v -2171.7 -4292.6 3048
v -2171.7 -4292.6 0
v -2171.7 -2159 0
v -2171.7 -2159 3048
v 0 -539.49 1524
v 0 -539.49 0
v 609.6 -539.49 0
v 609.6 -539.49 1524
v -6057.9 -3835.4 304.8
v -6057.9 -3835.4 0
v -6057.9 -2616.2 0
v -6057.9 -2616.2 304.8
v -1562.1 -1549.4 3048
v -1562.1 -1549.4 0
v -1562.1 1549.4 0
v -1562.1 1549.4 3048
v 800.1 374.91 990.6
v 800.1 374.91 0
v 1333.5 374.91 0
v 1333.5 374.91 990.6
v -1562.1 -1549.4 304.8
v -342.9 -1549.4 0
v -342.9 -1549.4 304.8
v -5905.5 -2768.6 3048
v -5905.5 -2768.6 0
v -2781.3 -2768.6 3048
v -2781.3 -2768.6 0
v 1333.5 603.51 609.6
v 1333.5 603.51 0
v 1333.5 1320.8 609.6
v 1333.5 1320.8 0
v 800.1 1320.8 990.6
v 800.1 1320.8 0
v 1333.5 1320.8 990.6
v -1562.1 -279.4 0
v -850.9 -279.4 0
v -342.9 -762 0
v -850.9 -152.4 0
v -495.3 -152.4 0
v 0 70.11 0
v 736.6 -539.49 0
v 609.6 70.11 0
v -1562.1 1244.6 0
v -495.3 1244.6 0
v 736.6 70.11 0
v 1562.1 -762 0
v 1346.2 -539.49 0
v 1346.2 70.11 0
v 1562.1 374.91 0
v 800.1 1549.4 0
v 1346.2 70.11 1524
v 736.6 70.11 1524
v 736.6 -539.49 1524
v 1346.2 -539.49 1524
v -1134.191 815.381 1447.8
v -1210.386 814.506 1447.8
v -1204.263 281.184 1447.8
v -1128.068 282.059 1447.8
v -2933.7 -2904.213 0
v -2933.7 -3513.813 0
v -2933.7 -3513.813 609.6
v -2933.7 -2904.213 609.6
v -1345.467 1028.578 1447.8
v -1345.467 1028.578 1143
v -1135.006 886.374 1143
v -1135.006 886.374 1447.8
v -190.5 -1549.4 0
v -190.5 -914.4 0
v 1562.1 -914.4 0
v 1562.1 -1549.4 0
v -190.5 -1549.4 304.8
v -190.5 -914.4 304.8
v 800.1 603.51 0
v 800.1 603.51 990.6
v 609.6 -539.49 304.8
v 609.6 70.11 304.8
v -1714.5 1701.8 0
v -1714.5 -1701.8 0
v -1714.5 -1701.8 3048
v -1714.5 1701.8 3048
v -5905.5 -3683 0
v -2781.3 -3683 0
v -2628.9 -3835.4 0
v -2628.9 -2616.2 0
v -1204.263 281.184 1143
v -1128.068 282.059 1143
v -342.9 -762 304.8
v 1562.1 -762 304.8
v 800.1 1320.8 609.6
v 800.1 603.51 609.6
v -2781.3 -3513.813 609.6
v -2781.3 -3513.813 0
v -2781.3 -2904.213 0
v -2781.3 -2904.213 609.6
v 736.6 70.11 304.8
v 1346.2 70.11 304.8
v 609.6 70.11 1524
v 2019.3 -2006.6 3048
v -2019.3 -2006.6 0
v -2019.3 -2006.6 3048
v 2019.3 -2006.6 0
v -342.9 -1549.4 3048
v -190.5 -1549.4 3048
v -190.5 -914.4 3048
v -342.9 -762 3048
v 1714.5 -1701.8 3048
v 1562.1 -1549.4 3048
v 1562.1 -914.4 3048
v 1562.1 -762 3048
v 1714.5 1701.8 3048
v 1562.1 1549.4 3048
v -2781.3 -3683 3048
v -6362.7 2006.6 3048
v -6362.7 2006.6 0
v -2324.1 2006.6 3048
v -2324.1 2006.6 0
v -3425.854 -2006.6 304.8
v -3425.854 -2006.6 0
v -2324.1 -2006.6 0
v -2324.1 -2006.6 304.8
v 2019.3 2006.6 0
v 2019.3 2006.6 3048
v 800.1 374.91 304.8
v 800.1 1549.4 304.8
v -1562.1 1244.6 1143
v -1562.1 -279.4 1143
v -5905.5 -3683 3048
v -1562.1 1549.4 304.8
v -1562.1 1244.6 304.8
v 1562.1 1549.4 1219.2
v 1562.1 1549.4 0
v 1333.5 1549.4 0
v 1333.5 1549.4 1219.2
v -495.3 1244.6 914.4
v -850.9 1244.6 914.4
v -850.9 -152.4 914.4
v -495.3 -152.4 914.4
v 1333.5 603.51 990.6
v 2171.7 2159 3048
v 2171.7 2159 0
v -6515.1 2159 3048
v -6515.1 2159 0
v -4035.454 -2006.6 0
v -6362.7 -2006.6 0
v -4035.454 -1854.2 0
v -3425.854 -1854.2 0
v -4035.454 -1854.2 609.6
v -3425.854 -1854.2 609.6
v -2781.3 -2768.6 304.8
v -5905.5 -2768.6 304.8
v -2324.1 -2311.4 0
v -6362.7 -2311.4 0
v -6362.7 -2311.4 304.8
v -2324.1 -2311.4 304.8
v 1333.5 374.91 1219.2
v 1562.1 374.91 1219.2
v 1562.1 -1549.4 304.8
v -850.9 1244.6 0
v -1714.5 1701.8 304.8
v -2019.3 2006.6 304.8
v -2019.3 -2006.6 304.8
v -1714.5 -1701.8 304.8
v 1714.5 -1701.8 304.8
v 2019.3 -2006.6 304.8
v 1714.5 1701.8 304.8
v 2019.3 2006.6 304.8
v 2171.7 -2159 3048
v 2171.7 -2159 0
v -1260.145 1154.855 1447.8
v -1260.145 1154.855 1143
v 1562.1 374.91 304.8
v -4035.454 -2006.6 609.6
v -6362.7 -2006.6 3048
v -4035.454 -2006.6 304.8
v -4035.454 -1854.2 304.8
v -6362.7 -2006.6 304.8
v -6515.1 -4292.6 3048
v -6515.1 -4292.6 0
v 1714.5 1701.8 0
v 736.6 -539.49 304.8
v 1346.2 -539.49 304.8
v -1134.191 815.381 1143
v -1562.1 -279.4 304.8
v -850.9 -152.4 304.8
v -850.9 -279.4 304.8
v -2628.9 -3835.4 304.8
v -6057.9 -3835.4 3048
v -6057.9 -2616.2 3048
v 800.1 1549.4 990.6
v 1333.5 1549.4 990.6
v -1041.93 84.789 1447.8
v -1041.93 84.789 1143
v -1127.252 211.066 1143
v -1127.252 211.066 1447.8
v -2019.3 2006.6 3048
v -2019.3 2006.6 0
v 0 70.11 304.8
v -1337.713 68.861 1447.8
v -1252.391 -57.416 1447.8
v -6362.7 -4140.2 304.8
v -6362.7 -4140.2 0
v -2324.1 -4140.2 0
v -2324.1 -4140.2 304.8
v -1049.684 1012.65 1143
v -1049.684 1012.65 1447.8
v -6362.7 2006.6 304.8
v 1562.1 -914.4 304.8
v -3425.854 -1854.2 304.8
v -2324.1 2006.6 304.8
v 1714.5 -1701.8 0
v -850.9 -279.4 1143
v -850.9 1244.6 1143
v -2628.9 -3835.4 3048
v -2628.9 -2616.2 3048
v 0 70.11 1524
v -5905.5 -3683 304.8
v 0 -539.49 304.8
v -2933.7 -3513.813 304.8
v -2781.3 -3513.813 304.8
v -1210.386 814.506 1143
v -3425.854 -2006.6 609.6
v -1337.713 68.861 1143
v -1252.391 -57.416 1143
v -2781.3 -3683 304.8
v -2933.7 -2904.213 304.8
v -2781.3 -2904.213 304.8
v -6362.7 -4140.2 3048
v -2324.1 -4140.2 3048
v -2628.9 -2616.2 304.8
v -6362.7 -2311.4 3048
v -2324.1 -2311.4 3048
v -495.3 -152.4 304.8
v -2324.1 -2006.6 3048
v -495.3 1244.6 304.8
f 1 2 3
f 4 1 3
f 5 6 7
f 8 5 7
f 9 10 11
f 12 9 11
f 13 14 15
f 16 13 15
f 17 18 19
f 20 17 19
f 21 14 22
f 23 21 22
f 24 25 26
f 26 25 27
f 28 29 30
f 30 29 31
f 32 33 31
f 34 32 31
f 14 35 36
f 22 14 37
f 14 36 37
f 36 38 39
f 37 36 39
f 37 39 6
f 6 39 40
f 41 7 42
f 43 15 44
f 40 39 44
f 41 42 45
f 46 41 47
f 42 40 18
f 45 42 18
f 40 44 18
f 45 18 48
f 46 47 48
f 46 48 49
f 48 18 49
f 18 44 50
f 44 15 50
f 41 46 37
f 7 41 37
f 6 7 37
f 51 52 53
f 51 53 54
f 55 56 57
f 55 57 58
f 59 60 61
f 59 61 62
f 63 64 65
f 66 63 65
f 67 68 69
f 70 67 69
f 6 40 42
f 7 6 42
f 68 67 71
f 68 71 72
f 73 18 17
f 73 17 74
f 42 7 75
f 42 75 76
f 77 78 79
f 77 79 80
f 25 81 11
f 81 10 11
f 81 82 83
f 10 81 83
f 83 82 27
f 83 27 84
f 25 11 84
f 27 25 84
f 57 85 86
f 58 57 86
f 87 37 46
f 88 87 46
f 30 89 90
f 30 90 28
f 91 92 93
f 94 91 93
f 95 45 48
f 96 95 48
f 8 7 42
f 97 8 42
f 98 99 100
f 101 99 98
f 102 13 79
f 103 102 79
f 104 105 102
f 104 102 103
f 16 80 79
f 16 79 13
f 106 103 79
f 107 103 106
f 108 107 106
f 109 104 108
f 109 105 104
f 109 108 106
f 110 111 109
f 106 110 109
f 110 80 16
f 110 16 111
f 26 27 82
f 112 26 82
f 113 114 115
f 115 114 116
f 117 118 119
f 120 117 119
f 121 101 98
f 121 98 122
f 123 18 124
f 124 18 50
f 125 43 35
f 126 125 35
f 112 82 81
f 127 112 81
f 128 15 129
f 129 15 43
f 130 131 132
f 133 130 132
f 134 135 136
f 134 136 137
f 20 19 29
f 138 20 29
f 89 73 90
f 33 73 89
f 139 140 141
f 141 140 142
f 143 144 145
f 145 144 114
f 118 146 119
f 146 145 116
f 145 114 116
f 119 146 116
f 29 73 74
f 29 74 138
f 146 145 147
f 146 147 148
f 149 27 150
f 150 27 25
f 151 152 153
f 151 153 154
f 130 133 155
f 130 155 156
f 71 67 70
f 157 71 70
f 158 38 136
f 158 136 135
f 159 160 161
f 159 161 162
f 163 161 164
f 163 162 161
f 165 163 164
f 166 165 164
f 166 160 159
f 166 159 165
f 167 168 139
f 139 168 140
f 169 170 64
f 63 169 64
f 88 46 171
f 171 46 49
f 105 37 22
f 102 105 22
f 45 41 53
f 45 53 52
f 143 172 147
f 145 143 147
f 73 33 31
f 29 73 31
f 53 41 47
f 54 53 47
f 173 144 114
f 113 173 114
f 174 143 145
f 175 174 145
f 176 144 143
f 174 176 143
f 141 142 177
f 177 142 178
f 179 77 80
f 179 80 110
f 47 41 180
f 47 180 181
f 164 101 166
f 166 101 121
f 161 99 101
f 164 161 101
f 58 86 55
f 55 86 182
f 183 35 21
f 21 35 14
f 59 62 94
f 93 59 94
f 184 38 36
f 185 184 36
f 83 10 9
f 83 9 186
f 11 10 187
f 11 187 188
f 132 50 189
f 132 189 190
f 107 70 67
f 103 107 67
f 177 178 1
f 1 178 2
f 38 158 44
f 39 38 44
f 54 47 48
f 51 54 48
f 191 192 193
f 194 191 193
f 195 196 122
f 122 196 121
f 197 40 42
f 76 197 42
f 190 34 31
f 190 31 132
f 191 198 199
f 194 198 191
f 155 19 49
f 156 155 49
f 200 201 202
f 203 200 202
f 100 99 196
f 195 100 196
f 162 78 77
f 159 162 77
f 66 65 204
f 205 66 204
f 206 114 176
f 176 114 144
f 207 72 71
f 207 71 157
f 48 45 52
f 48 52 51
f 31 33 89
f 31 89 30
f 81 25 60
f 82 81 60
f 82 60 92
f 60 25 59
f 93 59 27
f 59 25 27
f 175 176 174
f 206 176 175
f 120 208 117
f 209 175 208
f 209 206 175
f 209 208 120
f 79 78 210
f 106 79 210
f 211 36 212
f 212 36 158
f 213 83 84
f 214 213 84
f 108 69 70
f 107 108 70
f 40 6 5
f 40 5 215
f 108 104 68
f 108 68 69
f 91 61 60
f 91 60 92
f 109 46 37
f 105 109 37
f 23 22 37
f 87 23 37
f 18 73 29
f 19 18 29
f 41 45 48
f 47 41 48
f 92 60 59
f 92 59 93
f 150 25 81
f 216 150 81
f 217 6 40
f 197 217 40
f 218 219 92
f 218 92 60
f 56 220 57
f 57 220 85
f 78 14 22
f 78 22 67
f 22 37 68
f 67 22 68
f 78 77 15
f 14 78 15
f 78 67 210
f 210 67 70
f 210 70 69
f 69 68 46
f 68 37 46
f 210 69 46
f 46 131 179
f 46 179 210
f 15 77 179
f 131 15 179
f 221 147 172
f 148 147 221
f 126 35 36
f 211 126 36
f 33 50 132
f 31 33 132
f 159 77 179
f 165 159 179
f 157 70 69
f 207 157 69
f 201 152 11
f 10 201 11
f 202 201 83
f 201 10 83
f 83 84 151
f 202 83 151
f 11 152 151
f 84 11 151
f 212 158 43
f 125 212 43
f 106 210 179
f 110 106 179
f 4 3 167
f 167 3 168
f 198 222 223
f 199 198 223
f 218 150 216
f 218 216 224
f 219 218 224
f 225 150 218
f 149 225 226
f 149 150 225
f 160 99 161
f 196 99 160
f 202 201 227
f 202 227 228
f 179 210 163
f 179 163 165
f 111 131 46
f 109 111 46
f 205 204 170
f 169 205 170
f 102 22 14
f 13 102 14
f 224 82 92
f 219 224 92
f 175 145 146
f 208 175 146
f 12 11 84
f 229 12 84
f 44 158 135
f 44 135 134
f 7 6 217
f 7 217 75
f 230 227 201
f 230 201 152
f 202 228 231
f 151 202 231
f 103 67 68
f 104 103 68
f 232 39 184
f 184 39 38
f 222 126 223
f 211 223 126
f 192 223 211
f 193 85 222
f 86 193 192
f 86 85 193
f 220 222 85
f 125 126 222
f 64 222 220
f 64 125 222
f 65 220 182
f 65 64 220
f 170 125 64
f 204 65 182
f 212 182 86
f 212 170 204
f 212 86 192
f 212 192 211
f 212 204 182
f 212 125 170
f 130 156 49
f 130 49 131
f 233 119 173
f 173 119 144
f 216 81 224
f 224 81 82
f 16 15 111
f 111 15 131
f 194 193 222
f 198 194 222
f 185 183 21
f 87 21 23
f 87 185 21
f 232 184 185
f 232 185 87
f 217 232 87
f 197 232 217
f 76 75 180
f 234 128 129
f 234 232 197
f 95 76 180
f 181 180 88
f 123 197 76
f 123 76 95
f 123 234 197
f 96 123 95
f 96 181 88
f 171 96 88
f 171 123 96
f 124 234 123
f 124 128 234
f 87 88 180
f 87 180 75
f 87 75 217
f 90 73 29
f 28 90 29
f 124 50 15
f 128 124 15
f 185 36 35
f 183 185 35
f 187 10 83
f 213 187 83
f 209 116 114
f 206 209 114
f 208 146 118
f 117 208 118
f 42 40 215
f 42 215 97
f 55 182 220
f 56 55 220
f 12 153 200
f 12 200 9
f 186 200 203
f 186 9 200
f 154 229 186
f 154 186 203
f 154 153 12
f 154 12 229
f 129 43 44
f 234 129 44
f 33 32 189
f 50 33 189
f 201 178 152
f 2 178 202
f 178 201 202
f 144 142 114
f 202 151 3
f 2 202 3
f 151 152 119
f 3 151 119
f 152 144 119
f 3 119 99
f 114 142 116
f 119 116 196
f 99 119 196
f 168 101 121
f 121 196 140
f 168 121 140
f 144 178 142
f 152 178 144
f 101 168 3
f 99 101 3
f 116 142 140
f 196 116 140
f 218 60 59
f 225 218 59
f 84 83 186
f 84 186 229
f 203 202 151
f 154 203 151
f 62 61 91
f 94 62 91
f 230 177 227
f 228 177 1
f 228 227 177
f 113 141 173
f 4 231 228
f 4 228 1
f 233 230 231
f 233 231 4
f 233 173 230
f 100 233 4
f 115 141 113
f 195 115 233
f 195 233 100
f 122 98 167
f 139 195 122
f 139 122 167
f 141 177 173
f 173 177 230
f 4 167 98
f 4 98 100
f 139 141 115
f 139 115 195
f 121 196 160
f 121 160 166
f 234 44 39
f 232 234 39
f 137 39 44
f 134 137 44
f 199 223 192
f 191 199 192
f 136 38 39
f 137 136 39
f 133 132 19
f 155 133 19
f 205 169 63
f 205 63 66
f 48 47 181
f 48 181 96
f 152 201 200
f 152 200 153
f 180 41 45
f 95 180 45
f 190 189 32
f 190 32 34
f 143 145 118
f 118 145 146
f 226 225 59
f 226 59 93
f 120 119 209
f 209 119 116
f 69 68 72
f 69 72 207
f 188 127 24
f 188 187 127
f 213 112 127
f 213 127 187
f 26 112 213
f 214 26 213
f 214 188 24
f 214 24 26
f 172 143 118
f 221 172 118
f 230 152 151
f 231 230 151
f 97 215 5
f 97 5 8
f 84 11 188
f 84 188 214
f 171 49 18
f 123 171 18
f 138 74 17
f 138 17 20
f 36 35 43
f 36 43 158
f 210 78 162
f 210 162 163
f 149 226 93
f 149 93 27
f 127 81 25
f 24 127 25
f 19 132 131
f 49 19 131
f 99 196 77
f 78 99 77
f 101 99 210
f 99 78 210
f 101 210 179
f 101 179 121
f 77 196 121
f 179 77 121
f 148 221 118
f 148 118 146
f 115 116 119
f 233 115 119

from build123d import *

# Parameters (mm, degrees)
F0_W      = 4343.4
F0_H      = 4318
F0_H_2    = 2133.6
F0_W_2    = 4038.6
F0_H_3    = 1828.8
F0_H_4    = 4013.2
F1_DEPTH  = 3048
F0_W_3    = 3429
F0_H_5    = 1219.2
F0_H_6    = 3403.6
F0_W_4    = 533.4
F0_H_7    = 228.6
F2_DEPTH  = 990.6
F0_H_8    = 717.2898056984
F3_DEPTH  = 609.6
F0_W_5    = 609.6
F0_H_9    = 609.6
F4_DEPTH  = 1524
F0_W_6    = 355.6
F0_H_10   = 1397
F5_DEPTH  = 914.4
F6_DEPTH  = 1143
F7_DEPTH  = 1447.8
F8_DEPTH  = 1219.2
F9_DEPTH  = 304.8
F0_W_7    = 1752.6
F0_H_11   = 635
F0_H_12   = 152.4
F10_DEPTH = 609.6
F0_W_8    = 152.4


with BuildPart() as f1:
    # F0 (on Top) → F1 (new body)
    with BuildSketch(Plane.XY):
        with Locations((-4343.4, 0)):
            Rectangle(F0_W, F0_H)
        Polygon((-6362.7, -2006.6), (-6362.7, 2006.6), (-2324.1, 2006.6), (-2324.1, -2006.6), (-3425.8539676666, -2006.6), (-4035.4539676666, -2006.6), align=None, mode=Mode.SUBTRACT)
        with Locations((-4343.4, -3225.8)):
            Rectangle(F0_W, F0_H_2)
        with Locations((-4343.4, -3225.8)):
            Rectangle(F0_W_2, F0_H_3, mode=Mode.SUBTRACT)
        Rectangle(F0_W, F0_H)
        Rectangle(F0_W_2, F0_H_4, mode=Mode.SUBTRACT)
    extrude(amount=F1_DEPTH)


with BuildPart() as f1b:
    # F0 (on Top) → F1, piece 2 (new body)
    with BuildSketch(Plane.XY):
        with Locations((-4343.4, -3225.8)):
            Rectangle(F0_W_3, F0_H_5)
        Polygon((-5905.5, -2768.6), (-2781.3, -2768.6), (-2781.3, -2904.2131900787), (-2781.3, -3513.8131900787), (-2781.3, -3683), (-5905.5, -3683), align=None, mode=Mode.SUBTRACT)
    extrude(amount=F1_DEPTH)


with BuildPart() as f1c:
    # F0 (on Top) → F1, piece 3 (new body)
    with BuildSketch(Plane.XY):
        Rectangle(F0_W_3, F0_H_6)
        Polygon((1333.5, 1549.4), (1562.1, 1549.4), (1562.1, 374.9101943016), (1562.1, -762), (1562.1, -914.4), (1562.1, -1549.4), (-190.5, -1549.4), (-342.9, -1549.4), (-1562.1, -1549.4), (-1562.1, -279.4), (-1562.1, 1244.6), (-1562.1, 1549.4), (800.1, 1549.4), align=None, mode=Mode.SUBTRACT)
        Polygon((1562.1, -914.4), (1562.1, -762), (-342.9, -762), (-342.9, -1549.4), (-190.5, -1549.4), (-190.5, -914.4), align=None)
    extrude(amount=F1_DEPTH)


with BuildPart() as f2:
    # F0 (on Top) → F2 (new body)
    with BuildSketch(Plane.XY):
        with Locations((1066.8, 1435.1)):
            Rectangle(F0_W_4, F0_H_7)
    extrude(amount=F2_DEPTH)


with BuildPart() as f2b:
    # F0 (on Top) → F2, piece 2 (new body)
    with BuildSketch(Plane.XY):
        with Locations((1066.8, 489.2101943016)):
            Rectangle(F0_W_4, F0_H_7)
    extrude(amount=F2_DEPTH)


with BuildPart() as f3:
    # F0 (on Top) → F3 (new body)
    with BuildSketch(Plane.XY):
        with Locations((1066.8, 962.1550971508)):
            Rectangle(F0_W_4, F0_H_8)
    extrude(amount=F3_DEPTH)


with BuildPart() as f4:
    # F0 (on Top) → F4 (new body)
    with BuildSketch(Plane.XY):
        with Locations((304.8, -234.6898056984)):
            Rectangle(F0_W_5, F0_H_9)
    extrude(amount=F4_DEPTH)


with BuildPart() as f4b:
    # F0 (on Top) → F4, piece 2 (new body)
    with BuildSketch(Plane.XY):
        with Locations((1041.4, -234.6898056984)):
            Rectangle(F0_W_5, F0_H_9)
    extrude(amount=F4_DEPTH)


with BuildPart() as f5:
    # F0 (on Top) → F5 (new body)
    with BuildSketch(Plane.XY):
        with Locations((-673.1, 546.1)):
            Rectangle(F0_W_6, F0_H_10)
    extrude(amount=F5_DEPTH)


with BuildPart() as f6:
    # F0 (on Top) → F6 (new body)
    with BuildSketch(Plane.XY):
        Polygon((-850.9, 1244.6), (-1562.1, 1244.6), (-1562.1, -279.4), (-850.9, -279.4), (-850.9, -152.4), align=None)
        Polygon((-1127.2523981686, 211.0656040807), (-1041.9296722146, 84.7889536825), (-1252.3907562116, -57.4155895741), (-1337.7134821655, 68.8610608241), align=None, mode=Mode.SUBTRACT)
        Polygon((-1210.3860998574, 814.505665424), (-1134.1911222959, 815.380533648), (-1128.0675374575, 282.0586040807), (-1204.2625150189, 281.1837358567), align=None, mode=Mode.SUBTRACT)
        Polygon((-1260.1446196279, 1154.8547273028), (-1049.6835356309, 1012.6501840462), (-1135.0062615849, 886.373533648), (-1345.4673455818, 1028.5780769046), align=None, mode=Mode.SUBTRACT)
    extrude(amount=F6_DEPTH)

    # F0 (on Top) → F7 (join)
    with BuildSketch(Plane.XY):
        Polygon((-1135.0062615849, 886.373533648), (-1049.6835356309, 1012.6501840462), (-1260.1446196279, 1154.8547273028), (-1345.4673455818, 1028.5780769046), align=None)
        Polygon((-1128.0675374575, 282.0586040807), (-1134.1911222959, 815.380533648), (-1210.3860998574, 814.505665424), (-1204.2625150189, 281.1837358567), align=None)
        Polygon((-1252.3907562116, -57.4155895741), (-1041.9296722146, 84.7889536825), (-1127.2523981686, 211.0656040807), (-1337.7134821655, 68.8610608241), align=None)
    extrude(amount=F7_DEPTH)


with BuildPart() as f8:
    # F0 (on Top) → F8 (new body)
    with BuildSketch(Plane.XY):
        Polygon((1562.1, 374.9101943016), (1562.1, 1549.4), (1333.5, 1549.4), (1333.5, 1320.8), (1333.5, 603.5101943016), (1333.5, 374.9101943016), align=None)
    extrude(amount=F8_DEPTH)


with BuildPart() as f9:
    # F0 (on Top) → F9 (new body)
    with BuildSketch(Plane.XY):
        Polygon((1562.1, -762), (1562.1, 374.9101943016), (1333.5, 374.9101943016), (800.1, 374.9101943016), (800.1, 603.5101943016), (800.1, 1320.8), (800.1, 1549.4), (-1562.1, 1549.4), (-1562.1, 1244.6), (-850.9, 1244.6), (-495.3, 1244.6), (-495.3, -152.4), (-850.9, -152.4), (-850.9, -279.4), (-1562.1, -279.4), (-1562.1, -1549.4), (-342.9, -1549.4), (-342.9, -762), align=None)
        with Locations((304.8, -234.6898056984)):
            Rectangle(F0_W_5, F0_H_9, mode=Mode.SUBTRACT)
        with Locations((1041.4, -234.6898056984)):
            Rectangle(F0_W_5, F0_H_9, mode=Mode.SUBTRACT)
    extrude(amount=F9_DEPTH)


with BuildPart() as f9b:
    # F0 (on Top) → F9, piece 2 (new body)
    with BuildSketch(Plane.XY):
        with Locations((685.8, -1231.9)):
            Rectangle(F0_W_7, F0_H_11)
    extrude(amount=F9_DEPTH)


with BuildPart() as f9c:
    # F0 (on Top) → F9, piece 3 (new body)
    with BuildSketch(Plane.XY):
        Rectangle(F0_W_2, F0_H_4)
        Rectangle(F0_W_3, F0_H_6, mode=Mode.SUBTRACT)
    extrude(amount=F9_DEPTH)


with BuildPart() as f9d:
    # F0 (on Top) → F9, piece 4 (new body)
    with BuildSketch(Plane.XY):
        Polygon((-2324.1, 2006.6), (-6362.7, 2006.6), (-6362.7, -2006.6), (-4035.4539676666, -2006.6), (-4035.4539676666, -1854.2), (-3425.8539676666, -1854.2), (-3425.8539676666, -2006.6), (-2324.1, -2006.6), align=None)
    extrude(amount=F9_DEPTH)


with BuildPart() as f9e:
    # F0 (on Top) → F9, piece 5 (new body)
    with BuildSketch(Plane.XY):
        Polygon((-2781.3, -2904.2131900787), (-2781.3, -2768.6), (-5905.5, -2768.6), (-5905.5, -3683), (-2781.3, -3683), (-2781.3, -3513.8131900787), (-2933.7, -3513.8131900787), (-2933.7, -2904.2131900787), align=None)
    extrude(amount=F9_DEPTH)


with BuildPart() as f9f:
    # F0 (on Top) → F9, piece 6 (new body)
    with BuildSketch(Plane.XY):
        with Locations((-4343.4, -3225.8)):
            Rectangle(F0_W_2, F0_H_3)
        with Locations((-4343.4, -3225.8)):
            Rectangle(F0_W_3, F0_H_5, mode=Mode.SUBTRACT)
    extrude(amount=F9_DEPTH)


with BuildPart() as f10:
    # F0 (on Top) → F10 (new body)
    with BuildSketch(Plane.XY):
        with Locations((-3730.6539676666, -1930.4)):
            Rectangle(F0_W_5, F0_H_12)
    extrude(amount=F10_DEPTH)


with BuildPart() as f10b:
    # F0 (on Top) → F10, piece 2 (new body)
    with BuildSketch(Plane.XY):
        with Locations((-2857.5, -3209.0131900787)):
            Rectangle(F0_W_8, F0_H_9)
    extrude(amount=F10_DEPTH)


solid = Compound([f1.part, f1b.part, f1c.part, f2.part, f2b.part, f3.part, f4.part, f4b.part, f5.part, f6.part, f8.part, f9.part, f9b.part, f9c.part, f9d.part, f9e.part, f9f.part, f10.part, f10b.part])
